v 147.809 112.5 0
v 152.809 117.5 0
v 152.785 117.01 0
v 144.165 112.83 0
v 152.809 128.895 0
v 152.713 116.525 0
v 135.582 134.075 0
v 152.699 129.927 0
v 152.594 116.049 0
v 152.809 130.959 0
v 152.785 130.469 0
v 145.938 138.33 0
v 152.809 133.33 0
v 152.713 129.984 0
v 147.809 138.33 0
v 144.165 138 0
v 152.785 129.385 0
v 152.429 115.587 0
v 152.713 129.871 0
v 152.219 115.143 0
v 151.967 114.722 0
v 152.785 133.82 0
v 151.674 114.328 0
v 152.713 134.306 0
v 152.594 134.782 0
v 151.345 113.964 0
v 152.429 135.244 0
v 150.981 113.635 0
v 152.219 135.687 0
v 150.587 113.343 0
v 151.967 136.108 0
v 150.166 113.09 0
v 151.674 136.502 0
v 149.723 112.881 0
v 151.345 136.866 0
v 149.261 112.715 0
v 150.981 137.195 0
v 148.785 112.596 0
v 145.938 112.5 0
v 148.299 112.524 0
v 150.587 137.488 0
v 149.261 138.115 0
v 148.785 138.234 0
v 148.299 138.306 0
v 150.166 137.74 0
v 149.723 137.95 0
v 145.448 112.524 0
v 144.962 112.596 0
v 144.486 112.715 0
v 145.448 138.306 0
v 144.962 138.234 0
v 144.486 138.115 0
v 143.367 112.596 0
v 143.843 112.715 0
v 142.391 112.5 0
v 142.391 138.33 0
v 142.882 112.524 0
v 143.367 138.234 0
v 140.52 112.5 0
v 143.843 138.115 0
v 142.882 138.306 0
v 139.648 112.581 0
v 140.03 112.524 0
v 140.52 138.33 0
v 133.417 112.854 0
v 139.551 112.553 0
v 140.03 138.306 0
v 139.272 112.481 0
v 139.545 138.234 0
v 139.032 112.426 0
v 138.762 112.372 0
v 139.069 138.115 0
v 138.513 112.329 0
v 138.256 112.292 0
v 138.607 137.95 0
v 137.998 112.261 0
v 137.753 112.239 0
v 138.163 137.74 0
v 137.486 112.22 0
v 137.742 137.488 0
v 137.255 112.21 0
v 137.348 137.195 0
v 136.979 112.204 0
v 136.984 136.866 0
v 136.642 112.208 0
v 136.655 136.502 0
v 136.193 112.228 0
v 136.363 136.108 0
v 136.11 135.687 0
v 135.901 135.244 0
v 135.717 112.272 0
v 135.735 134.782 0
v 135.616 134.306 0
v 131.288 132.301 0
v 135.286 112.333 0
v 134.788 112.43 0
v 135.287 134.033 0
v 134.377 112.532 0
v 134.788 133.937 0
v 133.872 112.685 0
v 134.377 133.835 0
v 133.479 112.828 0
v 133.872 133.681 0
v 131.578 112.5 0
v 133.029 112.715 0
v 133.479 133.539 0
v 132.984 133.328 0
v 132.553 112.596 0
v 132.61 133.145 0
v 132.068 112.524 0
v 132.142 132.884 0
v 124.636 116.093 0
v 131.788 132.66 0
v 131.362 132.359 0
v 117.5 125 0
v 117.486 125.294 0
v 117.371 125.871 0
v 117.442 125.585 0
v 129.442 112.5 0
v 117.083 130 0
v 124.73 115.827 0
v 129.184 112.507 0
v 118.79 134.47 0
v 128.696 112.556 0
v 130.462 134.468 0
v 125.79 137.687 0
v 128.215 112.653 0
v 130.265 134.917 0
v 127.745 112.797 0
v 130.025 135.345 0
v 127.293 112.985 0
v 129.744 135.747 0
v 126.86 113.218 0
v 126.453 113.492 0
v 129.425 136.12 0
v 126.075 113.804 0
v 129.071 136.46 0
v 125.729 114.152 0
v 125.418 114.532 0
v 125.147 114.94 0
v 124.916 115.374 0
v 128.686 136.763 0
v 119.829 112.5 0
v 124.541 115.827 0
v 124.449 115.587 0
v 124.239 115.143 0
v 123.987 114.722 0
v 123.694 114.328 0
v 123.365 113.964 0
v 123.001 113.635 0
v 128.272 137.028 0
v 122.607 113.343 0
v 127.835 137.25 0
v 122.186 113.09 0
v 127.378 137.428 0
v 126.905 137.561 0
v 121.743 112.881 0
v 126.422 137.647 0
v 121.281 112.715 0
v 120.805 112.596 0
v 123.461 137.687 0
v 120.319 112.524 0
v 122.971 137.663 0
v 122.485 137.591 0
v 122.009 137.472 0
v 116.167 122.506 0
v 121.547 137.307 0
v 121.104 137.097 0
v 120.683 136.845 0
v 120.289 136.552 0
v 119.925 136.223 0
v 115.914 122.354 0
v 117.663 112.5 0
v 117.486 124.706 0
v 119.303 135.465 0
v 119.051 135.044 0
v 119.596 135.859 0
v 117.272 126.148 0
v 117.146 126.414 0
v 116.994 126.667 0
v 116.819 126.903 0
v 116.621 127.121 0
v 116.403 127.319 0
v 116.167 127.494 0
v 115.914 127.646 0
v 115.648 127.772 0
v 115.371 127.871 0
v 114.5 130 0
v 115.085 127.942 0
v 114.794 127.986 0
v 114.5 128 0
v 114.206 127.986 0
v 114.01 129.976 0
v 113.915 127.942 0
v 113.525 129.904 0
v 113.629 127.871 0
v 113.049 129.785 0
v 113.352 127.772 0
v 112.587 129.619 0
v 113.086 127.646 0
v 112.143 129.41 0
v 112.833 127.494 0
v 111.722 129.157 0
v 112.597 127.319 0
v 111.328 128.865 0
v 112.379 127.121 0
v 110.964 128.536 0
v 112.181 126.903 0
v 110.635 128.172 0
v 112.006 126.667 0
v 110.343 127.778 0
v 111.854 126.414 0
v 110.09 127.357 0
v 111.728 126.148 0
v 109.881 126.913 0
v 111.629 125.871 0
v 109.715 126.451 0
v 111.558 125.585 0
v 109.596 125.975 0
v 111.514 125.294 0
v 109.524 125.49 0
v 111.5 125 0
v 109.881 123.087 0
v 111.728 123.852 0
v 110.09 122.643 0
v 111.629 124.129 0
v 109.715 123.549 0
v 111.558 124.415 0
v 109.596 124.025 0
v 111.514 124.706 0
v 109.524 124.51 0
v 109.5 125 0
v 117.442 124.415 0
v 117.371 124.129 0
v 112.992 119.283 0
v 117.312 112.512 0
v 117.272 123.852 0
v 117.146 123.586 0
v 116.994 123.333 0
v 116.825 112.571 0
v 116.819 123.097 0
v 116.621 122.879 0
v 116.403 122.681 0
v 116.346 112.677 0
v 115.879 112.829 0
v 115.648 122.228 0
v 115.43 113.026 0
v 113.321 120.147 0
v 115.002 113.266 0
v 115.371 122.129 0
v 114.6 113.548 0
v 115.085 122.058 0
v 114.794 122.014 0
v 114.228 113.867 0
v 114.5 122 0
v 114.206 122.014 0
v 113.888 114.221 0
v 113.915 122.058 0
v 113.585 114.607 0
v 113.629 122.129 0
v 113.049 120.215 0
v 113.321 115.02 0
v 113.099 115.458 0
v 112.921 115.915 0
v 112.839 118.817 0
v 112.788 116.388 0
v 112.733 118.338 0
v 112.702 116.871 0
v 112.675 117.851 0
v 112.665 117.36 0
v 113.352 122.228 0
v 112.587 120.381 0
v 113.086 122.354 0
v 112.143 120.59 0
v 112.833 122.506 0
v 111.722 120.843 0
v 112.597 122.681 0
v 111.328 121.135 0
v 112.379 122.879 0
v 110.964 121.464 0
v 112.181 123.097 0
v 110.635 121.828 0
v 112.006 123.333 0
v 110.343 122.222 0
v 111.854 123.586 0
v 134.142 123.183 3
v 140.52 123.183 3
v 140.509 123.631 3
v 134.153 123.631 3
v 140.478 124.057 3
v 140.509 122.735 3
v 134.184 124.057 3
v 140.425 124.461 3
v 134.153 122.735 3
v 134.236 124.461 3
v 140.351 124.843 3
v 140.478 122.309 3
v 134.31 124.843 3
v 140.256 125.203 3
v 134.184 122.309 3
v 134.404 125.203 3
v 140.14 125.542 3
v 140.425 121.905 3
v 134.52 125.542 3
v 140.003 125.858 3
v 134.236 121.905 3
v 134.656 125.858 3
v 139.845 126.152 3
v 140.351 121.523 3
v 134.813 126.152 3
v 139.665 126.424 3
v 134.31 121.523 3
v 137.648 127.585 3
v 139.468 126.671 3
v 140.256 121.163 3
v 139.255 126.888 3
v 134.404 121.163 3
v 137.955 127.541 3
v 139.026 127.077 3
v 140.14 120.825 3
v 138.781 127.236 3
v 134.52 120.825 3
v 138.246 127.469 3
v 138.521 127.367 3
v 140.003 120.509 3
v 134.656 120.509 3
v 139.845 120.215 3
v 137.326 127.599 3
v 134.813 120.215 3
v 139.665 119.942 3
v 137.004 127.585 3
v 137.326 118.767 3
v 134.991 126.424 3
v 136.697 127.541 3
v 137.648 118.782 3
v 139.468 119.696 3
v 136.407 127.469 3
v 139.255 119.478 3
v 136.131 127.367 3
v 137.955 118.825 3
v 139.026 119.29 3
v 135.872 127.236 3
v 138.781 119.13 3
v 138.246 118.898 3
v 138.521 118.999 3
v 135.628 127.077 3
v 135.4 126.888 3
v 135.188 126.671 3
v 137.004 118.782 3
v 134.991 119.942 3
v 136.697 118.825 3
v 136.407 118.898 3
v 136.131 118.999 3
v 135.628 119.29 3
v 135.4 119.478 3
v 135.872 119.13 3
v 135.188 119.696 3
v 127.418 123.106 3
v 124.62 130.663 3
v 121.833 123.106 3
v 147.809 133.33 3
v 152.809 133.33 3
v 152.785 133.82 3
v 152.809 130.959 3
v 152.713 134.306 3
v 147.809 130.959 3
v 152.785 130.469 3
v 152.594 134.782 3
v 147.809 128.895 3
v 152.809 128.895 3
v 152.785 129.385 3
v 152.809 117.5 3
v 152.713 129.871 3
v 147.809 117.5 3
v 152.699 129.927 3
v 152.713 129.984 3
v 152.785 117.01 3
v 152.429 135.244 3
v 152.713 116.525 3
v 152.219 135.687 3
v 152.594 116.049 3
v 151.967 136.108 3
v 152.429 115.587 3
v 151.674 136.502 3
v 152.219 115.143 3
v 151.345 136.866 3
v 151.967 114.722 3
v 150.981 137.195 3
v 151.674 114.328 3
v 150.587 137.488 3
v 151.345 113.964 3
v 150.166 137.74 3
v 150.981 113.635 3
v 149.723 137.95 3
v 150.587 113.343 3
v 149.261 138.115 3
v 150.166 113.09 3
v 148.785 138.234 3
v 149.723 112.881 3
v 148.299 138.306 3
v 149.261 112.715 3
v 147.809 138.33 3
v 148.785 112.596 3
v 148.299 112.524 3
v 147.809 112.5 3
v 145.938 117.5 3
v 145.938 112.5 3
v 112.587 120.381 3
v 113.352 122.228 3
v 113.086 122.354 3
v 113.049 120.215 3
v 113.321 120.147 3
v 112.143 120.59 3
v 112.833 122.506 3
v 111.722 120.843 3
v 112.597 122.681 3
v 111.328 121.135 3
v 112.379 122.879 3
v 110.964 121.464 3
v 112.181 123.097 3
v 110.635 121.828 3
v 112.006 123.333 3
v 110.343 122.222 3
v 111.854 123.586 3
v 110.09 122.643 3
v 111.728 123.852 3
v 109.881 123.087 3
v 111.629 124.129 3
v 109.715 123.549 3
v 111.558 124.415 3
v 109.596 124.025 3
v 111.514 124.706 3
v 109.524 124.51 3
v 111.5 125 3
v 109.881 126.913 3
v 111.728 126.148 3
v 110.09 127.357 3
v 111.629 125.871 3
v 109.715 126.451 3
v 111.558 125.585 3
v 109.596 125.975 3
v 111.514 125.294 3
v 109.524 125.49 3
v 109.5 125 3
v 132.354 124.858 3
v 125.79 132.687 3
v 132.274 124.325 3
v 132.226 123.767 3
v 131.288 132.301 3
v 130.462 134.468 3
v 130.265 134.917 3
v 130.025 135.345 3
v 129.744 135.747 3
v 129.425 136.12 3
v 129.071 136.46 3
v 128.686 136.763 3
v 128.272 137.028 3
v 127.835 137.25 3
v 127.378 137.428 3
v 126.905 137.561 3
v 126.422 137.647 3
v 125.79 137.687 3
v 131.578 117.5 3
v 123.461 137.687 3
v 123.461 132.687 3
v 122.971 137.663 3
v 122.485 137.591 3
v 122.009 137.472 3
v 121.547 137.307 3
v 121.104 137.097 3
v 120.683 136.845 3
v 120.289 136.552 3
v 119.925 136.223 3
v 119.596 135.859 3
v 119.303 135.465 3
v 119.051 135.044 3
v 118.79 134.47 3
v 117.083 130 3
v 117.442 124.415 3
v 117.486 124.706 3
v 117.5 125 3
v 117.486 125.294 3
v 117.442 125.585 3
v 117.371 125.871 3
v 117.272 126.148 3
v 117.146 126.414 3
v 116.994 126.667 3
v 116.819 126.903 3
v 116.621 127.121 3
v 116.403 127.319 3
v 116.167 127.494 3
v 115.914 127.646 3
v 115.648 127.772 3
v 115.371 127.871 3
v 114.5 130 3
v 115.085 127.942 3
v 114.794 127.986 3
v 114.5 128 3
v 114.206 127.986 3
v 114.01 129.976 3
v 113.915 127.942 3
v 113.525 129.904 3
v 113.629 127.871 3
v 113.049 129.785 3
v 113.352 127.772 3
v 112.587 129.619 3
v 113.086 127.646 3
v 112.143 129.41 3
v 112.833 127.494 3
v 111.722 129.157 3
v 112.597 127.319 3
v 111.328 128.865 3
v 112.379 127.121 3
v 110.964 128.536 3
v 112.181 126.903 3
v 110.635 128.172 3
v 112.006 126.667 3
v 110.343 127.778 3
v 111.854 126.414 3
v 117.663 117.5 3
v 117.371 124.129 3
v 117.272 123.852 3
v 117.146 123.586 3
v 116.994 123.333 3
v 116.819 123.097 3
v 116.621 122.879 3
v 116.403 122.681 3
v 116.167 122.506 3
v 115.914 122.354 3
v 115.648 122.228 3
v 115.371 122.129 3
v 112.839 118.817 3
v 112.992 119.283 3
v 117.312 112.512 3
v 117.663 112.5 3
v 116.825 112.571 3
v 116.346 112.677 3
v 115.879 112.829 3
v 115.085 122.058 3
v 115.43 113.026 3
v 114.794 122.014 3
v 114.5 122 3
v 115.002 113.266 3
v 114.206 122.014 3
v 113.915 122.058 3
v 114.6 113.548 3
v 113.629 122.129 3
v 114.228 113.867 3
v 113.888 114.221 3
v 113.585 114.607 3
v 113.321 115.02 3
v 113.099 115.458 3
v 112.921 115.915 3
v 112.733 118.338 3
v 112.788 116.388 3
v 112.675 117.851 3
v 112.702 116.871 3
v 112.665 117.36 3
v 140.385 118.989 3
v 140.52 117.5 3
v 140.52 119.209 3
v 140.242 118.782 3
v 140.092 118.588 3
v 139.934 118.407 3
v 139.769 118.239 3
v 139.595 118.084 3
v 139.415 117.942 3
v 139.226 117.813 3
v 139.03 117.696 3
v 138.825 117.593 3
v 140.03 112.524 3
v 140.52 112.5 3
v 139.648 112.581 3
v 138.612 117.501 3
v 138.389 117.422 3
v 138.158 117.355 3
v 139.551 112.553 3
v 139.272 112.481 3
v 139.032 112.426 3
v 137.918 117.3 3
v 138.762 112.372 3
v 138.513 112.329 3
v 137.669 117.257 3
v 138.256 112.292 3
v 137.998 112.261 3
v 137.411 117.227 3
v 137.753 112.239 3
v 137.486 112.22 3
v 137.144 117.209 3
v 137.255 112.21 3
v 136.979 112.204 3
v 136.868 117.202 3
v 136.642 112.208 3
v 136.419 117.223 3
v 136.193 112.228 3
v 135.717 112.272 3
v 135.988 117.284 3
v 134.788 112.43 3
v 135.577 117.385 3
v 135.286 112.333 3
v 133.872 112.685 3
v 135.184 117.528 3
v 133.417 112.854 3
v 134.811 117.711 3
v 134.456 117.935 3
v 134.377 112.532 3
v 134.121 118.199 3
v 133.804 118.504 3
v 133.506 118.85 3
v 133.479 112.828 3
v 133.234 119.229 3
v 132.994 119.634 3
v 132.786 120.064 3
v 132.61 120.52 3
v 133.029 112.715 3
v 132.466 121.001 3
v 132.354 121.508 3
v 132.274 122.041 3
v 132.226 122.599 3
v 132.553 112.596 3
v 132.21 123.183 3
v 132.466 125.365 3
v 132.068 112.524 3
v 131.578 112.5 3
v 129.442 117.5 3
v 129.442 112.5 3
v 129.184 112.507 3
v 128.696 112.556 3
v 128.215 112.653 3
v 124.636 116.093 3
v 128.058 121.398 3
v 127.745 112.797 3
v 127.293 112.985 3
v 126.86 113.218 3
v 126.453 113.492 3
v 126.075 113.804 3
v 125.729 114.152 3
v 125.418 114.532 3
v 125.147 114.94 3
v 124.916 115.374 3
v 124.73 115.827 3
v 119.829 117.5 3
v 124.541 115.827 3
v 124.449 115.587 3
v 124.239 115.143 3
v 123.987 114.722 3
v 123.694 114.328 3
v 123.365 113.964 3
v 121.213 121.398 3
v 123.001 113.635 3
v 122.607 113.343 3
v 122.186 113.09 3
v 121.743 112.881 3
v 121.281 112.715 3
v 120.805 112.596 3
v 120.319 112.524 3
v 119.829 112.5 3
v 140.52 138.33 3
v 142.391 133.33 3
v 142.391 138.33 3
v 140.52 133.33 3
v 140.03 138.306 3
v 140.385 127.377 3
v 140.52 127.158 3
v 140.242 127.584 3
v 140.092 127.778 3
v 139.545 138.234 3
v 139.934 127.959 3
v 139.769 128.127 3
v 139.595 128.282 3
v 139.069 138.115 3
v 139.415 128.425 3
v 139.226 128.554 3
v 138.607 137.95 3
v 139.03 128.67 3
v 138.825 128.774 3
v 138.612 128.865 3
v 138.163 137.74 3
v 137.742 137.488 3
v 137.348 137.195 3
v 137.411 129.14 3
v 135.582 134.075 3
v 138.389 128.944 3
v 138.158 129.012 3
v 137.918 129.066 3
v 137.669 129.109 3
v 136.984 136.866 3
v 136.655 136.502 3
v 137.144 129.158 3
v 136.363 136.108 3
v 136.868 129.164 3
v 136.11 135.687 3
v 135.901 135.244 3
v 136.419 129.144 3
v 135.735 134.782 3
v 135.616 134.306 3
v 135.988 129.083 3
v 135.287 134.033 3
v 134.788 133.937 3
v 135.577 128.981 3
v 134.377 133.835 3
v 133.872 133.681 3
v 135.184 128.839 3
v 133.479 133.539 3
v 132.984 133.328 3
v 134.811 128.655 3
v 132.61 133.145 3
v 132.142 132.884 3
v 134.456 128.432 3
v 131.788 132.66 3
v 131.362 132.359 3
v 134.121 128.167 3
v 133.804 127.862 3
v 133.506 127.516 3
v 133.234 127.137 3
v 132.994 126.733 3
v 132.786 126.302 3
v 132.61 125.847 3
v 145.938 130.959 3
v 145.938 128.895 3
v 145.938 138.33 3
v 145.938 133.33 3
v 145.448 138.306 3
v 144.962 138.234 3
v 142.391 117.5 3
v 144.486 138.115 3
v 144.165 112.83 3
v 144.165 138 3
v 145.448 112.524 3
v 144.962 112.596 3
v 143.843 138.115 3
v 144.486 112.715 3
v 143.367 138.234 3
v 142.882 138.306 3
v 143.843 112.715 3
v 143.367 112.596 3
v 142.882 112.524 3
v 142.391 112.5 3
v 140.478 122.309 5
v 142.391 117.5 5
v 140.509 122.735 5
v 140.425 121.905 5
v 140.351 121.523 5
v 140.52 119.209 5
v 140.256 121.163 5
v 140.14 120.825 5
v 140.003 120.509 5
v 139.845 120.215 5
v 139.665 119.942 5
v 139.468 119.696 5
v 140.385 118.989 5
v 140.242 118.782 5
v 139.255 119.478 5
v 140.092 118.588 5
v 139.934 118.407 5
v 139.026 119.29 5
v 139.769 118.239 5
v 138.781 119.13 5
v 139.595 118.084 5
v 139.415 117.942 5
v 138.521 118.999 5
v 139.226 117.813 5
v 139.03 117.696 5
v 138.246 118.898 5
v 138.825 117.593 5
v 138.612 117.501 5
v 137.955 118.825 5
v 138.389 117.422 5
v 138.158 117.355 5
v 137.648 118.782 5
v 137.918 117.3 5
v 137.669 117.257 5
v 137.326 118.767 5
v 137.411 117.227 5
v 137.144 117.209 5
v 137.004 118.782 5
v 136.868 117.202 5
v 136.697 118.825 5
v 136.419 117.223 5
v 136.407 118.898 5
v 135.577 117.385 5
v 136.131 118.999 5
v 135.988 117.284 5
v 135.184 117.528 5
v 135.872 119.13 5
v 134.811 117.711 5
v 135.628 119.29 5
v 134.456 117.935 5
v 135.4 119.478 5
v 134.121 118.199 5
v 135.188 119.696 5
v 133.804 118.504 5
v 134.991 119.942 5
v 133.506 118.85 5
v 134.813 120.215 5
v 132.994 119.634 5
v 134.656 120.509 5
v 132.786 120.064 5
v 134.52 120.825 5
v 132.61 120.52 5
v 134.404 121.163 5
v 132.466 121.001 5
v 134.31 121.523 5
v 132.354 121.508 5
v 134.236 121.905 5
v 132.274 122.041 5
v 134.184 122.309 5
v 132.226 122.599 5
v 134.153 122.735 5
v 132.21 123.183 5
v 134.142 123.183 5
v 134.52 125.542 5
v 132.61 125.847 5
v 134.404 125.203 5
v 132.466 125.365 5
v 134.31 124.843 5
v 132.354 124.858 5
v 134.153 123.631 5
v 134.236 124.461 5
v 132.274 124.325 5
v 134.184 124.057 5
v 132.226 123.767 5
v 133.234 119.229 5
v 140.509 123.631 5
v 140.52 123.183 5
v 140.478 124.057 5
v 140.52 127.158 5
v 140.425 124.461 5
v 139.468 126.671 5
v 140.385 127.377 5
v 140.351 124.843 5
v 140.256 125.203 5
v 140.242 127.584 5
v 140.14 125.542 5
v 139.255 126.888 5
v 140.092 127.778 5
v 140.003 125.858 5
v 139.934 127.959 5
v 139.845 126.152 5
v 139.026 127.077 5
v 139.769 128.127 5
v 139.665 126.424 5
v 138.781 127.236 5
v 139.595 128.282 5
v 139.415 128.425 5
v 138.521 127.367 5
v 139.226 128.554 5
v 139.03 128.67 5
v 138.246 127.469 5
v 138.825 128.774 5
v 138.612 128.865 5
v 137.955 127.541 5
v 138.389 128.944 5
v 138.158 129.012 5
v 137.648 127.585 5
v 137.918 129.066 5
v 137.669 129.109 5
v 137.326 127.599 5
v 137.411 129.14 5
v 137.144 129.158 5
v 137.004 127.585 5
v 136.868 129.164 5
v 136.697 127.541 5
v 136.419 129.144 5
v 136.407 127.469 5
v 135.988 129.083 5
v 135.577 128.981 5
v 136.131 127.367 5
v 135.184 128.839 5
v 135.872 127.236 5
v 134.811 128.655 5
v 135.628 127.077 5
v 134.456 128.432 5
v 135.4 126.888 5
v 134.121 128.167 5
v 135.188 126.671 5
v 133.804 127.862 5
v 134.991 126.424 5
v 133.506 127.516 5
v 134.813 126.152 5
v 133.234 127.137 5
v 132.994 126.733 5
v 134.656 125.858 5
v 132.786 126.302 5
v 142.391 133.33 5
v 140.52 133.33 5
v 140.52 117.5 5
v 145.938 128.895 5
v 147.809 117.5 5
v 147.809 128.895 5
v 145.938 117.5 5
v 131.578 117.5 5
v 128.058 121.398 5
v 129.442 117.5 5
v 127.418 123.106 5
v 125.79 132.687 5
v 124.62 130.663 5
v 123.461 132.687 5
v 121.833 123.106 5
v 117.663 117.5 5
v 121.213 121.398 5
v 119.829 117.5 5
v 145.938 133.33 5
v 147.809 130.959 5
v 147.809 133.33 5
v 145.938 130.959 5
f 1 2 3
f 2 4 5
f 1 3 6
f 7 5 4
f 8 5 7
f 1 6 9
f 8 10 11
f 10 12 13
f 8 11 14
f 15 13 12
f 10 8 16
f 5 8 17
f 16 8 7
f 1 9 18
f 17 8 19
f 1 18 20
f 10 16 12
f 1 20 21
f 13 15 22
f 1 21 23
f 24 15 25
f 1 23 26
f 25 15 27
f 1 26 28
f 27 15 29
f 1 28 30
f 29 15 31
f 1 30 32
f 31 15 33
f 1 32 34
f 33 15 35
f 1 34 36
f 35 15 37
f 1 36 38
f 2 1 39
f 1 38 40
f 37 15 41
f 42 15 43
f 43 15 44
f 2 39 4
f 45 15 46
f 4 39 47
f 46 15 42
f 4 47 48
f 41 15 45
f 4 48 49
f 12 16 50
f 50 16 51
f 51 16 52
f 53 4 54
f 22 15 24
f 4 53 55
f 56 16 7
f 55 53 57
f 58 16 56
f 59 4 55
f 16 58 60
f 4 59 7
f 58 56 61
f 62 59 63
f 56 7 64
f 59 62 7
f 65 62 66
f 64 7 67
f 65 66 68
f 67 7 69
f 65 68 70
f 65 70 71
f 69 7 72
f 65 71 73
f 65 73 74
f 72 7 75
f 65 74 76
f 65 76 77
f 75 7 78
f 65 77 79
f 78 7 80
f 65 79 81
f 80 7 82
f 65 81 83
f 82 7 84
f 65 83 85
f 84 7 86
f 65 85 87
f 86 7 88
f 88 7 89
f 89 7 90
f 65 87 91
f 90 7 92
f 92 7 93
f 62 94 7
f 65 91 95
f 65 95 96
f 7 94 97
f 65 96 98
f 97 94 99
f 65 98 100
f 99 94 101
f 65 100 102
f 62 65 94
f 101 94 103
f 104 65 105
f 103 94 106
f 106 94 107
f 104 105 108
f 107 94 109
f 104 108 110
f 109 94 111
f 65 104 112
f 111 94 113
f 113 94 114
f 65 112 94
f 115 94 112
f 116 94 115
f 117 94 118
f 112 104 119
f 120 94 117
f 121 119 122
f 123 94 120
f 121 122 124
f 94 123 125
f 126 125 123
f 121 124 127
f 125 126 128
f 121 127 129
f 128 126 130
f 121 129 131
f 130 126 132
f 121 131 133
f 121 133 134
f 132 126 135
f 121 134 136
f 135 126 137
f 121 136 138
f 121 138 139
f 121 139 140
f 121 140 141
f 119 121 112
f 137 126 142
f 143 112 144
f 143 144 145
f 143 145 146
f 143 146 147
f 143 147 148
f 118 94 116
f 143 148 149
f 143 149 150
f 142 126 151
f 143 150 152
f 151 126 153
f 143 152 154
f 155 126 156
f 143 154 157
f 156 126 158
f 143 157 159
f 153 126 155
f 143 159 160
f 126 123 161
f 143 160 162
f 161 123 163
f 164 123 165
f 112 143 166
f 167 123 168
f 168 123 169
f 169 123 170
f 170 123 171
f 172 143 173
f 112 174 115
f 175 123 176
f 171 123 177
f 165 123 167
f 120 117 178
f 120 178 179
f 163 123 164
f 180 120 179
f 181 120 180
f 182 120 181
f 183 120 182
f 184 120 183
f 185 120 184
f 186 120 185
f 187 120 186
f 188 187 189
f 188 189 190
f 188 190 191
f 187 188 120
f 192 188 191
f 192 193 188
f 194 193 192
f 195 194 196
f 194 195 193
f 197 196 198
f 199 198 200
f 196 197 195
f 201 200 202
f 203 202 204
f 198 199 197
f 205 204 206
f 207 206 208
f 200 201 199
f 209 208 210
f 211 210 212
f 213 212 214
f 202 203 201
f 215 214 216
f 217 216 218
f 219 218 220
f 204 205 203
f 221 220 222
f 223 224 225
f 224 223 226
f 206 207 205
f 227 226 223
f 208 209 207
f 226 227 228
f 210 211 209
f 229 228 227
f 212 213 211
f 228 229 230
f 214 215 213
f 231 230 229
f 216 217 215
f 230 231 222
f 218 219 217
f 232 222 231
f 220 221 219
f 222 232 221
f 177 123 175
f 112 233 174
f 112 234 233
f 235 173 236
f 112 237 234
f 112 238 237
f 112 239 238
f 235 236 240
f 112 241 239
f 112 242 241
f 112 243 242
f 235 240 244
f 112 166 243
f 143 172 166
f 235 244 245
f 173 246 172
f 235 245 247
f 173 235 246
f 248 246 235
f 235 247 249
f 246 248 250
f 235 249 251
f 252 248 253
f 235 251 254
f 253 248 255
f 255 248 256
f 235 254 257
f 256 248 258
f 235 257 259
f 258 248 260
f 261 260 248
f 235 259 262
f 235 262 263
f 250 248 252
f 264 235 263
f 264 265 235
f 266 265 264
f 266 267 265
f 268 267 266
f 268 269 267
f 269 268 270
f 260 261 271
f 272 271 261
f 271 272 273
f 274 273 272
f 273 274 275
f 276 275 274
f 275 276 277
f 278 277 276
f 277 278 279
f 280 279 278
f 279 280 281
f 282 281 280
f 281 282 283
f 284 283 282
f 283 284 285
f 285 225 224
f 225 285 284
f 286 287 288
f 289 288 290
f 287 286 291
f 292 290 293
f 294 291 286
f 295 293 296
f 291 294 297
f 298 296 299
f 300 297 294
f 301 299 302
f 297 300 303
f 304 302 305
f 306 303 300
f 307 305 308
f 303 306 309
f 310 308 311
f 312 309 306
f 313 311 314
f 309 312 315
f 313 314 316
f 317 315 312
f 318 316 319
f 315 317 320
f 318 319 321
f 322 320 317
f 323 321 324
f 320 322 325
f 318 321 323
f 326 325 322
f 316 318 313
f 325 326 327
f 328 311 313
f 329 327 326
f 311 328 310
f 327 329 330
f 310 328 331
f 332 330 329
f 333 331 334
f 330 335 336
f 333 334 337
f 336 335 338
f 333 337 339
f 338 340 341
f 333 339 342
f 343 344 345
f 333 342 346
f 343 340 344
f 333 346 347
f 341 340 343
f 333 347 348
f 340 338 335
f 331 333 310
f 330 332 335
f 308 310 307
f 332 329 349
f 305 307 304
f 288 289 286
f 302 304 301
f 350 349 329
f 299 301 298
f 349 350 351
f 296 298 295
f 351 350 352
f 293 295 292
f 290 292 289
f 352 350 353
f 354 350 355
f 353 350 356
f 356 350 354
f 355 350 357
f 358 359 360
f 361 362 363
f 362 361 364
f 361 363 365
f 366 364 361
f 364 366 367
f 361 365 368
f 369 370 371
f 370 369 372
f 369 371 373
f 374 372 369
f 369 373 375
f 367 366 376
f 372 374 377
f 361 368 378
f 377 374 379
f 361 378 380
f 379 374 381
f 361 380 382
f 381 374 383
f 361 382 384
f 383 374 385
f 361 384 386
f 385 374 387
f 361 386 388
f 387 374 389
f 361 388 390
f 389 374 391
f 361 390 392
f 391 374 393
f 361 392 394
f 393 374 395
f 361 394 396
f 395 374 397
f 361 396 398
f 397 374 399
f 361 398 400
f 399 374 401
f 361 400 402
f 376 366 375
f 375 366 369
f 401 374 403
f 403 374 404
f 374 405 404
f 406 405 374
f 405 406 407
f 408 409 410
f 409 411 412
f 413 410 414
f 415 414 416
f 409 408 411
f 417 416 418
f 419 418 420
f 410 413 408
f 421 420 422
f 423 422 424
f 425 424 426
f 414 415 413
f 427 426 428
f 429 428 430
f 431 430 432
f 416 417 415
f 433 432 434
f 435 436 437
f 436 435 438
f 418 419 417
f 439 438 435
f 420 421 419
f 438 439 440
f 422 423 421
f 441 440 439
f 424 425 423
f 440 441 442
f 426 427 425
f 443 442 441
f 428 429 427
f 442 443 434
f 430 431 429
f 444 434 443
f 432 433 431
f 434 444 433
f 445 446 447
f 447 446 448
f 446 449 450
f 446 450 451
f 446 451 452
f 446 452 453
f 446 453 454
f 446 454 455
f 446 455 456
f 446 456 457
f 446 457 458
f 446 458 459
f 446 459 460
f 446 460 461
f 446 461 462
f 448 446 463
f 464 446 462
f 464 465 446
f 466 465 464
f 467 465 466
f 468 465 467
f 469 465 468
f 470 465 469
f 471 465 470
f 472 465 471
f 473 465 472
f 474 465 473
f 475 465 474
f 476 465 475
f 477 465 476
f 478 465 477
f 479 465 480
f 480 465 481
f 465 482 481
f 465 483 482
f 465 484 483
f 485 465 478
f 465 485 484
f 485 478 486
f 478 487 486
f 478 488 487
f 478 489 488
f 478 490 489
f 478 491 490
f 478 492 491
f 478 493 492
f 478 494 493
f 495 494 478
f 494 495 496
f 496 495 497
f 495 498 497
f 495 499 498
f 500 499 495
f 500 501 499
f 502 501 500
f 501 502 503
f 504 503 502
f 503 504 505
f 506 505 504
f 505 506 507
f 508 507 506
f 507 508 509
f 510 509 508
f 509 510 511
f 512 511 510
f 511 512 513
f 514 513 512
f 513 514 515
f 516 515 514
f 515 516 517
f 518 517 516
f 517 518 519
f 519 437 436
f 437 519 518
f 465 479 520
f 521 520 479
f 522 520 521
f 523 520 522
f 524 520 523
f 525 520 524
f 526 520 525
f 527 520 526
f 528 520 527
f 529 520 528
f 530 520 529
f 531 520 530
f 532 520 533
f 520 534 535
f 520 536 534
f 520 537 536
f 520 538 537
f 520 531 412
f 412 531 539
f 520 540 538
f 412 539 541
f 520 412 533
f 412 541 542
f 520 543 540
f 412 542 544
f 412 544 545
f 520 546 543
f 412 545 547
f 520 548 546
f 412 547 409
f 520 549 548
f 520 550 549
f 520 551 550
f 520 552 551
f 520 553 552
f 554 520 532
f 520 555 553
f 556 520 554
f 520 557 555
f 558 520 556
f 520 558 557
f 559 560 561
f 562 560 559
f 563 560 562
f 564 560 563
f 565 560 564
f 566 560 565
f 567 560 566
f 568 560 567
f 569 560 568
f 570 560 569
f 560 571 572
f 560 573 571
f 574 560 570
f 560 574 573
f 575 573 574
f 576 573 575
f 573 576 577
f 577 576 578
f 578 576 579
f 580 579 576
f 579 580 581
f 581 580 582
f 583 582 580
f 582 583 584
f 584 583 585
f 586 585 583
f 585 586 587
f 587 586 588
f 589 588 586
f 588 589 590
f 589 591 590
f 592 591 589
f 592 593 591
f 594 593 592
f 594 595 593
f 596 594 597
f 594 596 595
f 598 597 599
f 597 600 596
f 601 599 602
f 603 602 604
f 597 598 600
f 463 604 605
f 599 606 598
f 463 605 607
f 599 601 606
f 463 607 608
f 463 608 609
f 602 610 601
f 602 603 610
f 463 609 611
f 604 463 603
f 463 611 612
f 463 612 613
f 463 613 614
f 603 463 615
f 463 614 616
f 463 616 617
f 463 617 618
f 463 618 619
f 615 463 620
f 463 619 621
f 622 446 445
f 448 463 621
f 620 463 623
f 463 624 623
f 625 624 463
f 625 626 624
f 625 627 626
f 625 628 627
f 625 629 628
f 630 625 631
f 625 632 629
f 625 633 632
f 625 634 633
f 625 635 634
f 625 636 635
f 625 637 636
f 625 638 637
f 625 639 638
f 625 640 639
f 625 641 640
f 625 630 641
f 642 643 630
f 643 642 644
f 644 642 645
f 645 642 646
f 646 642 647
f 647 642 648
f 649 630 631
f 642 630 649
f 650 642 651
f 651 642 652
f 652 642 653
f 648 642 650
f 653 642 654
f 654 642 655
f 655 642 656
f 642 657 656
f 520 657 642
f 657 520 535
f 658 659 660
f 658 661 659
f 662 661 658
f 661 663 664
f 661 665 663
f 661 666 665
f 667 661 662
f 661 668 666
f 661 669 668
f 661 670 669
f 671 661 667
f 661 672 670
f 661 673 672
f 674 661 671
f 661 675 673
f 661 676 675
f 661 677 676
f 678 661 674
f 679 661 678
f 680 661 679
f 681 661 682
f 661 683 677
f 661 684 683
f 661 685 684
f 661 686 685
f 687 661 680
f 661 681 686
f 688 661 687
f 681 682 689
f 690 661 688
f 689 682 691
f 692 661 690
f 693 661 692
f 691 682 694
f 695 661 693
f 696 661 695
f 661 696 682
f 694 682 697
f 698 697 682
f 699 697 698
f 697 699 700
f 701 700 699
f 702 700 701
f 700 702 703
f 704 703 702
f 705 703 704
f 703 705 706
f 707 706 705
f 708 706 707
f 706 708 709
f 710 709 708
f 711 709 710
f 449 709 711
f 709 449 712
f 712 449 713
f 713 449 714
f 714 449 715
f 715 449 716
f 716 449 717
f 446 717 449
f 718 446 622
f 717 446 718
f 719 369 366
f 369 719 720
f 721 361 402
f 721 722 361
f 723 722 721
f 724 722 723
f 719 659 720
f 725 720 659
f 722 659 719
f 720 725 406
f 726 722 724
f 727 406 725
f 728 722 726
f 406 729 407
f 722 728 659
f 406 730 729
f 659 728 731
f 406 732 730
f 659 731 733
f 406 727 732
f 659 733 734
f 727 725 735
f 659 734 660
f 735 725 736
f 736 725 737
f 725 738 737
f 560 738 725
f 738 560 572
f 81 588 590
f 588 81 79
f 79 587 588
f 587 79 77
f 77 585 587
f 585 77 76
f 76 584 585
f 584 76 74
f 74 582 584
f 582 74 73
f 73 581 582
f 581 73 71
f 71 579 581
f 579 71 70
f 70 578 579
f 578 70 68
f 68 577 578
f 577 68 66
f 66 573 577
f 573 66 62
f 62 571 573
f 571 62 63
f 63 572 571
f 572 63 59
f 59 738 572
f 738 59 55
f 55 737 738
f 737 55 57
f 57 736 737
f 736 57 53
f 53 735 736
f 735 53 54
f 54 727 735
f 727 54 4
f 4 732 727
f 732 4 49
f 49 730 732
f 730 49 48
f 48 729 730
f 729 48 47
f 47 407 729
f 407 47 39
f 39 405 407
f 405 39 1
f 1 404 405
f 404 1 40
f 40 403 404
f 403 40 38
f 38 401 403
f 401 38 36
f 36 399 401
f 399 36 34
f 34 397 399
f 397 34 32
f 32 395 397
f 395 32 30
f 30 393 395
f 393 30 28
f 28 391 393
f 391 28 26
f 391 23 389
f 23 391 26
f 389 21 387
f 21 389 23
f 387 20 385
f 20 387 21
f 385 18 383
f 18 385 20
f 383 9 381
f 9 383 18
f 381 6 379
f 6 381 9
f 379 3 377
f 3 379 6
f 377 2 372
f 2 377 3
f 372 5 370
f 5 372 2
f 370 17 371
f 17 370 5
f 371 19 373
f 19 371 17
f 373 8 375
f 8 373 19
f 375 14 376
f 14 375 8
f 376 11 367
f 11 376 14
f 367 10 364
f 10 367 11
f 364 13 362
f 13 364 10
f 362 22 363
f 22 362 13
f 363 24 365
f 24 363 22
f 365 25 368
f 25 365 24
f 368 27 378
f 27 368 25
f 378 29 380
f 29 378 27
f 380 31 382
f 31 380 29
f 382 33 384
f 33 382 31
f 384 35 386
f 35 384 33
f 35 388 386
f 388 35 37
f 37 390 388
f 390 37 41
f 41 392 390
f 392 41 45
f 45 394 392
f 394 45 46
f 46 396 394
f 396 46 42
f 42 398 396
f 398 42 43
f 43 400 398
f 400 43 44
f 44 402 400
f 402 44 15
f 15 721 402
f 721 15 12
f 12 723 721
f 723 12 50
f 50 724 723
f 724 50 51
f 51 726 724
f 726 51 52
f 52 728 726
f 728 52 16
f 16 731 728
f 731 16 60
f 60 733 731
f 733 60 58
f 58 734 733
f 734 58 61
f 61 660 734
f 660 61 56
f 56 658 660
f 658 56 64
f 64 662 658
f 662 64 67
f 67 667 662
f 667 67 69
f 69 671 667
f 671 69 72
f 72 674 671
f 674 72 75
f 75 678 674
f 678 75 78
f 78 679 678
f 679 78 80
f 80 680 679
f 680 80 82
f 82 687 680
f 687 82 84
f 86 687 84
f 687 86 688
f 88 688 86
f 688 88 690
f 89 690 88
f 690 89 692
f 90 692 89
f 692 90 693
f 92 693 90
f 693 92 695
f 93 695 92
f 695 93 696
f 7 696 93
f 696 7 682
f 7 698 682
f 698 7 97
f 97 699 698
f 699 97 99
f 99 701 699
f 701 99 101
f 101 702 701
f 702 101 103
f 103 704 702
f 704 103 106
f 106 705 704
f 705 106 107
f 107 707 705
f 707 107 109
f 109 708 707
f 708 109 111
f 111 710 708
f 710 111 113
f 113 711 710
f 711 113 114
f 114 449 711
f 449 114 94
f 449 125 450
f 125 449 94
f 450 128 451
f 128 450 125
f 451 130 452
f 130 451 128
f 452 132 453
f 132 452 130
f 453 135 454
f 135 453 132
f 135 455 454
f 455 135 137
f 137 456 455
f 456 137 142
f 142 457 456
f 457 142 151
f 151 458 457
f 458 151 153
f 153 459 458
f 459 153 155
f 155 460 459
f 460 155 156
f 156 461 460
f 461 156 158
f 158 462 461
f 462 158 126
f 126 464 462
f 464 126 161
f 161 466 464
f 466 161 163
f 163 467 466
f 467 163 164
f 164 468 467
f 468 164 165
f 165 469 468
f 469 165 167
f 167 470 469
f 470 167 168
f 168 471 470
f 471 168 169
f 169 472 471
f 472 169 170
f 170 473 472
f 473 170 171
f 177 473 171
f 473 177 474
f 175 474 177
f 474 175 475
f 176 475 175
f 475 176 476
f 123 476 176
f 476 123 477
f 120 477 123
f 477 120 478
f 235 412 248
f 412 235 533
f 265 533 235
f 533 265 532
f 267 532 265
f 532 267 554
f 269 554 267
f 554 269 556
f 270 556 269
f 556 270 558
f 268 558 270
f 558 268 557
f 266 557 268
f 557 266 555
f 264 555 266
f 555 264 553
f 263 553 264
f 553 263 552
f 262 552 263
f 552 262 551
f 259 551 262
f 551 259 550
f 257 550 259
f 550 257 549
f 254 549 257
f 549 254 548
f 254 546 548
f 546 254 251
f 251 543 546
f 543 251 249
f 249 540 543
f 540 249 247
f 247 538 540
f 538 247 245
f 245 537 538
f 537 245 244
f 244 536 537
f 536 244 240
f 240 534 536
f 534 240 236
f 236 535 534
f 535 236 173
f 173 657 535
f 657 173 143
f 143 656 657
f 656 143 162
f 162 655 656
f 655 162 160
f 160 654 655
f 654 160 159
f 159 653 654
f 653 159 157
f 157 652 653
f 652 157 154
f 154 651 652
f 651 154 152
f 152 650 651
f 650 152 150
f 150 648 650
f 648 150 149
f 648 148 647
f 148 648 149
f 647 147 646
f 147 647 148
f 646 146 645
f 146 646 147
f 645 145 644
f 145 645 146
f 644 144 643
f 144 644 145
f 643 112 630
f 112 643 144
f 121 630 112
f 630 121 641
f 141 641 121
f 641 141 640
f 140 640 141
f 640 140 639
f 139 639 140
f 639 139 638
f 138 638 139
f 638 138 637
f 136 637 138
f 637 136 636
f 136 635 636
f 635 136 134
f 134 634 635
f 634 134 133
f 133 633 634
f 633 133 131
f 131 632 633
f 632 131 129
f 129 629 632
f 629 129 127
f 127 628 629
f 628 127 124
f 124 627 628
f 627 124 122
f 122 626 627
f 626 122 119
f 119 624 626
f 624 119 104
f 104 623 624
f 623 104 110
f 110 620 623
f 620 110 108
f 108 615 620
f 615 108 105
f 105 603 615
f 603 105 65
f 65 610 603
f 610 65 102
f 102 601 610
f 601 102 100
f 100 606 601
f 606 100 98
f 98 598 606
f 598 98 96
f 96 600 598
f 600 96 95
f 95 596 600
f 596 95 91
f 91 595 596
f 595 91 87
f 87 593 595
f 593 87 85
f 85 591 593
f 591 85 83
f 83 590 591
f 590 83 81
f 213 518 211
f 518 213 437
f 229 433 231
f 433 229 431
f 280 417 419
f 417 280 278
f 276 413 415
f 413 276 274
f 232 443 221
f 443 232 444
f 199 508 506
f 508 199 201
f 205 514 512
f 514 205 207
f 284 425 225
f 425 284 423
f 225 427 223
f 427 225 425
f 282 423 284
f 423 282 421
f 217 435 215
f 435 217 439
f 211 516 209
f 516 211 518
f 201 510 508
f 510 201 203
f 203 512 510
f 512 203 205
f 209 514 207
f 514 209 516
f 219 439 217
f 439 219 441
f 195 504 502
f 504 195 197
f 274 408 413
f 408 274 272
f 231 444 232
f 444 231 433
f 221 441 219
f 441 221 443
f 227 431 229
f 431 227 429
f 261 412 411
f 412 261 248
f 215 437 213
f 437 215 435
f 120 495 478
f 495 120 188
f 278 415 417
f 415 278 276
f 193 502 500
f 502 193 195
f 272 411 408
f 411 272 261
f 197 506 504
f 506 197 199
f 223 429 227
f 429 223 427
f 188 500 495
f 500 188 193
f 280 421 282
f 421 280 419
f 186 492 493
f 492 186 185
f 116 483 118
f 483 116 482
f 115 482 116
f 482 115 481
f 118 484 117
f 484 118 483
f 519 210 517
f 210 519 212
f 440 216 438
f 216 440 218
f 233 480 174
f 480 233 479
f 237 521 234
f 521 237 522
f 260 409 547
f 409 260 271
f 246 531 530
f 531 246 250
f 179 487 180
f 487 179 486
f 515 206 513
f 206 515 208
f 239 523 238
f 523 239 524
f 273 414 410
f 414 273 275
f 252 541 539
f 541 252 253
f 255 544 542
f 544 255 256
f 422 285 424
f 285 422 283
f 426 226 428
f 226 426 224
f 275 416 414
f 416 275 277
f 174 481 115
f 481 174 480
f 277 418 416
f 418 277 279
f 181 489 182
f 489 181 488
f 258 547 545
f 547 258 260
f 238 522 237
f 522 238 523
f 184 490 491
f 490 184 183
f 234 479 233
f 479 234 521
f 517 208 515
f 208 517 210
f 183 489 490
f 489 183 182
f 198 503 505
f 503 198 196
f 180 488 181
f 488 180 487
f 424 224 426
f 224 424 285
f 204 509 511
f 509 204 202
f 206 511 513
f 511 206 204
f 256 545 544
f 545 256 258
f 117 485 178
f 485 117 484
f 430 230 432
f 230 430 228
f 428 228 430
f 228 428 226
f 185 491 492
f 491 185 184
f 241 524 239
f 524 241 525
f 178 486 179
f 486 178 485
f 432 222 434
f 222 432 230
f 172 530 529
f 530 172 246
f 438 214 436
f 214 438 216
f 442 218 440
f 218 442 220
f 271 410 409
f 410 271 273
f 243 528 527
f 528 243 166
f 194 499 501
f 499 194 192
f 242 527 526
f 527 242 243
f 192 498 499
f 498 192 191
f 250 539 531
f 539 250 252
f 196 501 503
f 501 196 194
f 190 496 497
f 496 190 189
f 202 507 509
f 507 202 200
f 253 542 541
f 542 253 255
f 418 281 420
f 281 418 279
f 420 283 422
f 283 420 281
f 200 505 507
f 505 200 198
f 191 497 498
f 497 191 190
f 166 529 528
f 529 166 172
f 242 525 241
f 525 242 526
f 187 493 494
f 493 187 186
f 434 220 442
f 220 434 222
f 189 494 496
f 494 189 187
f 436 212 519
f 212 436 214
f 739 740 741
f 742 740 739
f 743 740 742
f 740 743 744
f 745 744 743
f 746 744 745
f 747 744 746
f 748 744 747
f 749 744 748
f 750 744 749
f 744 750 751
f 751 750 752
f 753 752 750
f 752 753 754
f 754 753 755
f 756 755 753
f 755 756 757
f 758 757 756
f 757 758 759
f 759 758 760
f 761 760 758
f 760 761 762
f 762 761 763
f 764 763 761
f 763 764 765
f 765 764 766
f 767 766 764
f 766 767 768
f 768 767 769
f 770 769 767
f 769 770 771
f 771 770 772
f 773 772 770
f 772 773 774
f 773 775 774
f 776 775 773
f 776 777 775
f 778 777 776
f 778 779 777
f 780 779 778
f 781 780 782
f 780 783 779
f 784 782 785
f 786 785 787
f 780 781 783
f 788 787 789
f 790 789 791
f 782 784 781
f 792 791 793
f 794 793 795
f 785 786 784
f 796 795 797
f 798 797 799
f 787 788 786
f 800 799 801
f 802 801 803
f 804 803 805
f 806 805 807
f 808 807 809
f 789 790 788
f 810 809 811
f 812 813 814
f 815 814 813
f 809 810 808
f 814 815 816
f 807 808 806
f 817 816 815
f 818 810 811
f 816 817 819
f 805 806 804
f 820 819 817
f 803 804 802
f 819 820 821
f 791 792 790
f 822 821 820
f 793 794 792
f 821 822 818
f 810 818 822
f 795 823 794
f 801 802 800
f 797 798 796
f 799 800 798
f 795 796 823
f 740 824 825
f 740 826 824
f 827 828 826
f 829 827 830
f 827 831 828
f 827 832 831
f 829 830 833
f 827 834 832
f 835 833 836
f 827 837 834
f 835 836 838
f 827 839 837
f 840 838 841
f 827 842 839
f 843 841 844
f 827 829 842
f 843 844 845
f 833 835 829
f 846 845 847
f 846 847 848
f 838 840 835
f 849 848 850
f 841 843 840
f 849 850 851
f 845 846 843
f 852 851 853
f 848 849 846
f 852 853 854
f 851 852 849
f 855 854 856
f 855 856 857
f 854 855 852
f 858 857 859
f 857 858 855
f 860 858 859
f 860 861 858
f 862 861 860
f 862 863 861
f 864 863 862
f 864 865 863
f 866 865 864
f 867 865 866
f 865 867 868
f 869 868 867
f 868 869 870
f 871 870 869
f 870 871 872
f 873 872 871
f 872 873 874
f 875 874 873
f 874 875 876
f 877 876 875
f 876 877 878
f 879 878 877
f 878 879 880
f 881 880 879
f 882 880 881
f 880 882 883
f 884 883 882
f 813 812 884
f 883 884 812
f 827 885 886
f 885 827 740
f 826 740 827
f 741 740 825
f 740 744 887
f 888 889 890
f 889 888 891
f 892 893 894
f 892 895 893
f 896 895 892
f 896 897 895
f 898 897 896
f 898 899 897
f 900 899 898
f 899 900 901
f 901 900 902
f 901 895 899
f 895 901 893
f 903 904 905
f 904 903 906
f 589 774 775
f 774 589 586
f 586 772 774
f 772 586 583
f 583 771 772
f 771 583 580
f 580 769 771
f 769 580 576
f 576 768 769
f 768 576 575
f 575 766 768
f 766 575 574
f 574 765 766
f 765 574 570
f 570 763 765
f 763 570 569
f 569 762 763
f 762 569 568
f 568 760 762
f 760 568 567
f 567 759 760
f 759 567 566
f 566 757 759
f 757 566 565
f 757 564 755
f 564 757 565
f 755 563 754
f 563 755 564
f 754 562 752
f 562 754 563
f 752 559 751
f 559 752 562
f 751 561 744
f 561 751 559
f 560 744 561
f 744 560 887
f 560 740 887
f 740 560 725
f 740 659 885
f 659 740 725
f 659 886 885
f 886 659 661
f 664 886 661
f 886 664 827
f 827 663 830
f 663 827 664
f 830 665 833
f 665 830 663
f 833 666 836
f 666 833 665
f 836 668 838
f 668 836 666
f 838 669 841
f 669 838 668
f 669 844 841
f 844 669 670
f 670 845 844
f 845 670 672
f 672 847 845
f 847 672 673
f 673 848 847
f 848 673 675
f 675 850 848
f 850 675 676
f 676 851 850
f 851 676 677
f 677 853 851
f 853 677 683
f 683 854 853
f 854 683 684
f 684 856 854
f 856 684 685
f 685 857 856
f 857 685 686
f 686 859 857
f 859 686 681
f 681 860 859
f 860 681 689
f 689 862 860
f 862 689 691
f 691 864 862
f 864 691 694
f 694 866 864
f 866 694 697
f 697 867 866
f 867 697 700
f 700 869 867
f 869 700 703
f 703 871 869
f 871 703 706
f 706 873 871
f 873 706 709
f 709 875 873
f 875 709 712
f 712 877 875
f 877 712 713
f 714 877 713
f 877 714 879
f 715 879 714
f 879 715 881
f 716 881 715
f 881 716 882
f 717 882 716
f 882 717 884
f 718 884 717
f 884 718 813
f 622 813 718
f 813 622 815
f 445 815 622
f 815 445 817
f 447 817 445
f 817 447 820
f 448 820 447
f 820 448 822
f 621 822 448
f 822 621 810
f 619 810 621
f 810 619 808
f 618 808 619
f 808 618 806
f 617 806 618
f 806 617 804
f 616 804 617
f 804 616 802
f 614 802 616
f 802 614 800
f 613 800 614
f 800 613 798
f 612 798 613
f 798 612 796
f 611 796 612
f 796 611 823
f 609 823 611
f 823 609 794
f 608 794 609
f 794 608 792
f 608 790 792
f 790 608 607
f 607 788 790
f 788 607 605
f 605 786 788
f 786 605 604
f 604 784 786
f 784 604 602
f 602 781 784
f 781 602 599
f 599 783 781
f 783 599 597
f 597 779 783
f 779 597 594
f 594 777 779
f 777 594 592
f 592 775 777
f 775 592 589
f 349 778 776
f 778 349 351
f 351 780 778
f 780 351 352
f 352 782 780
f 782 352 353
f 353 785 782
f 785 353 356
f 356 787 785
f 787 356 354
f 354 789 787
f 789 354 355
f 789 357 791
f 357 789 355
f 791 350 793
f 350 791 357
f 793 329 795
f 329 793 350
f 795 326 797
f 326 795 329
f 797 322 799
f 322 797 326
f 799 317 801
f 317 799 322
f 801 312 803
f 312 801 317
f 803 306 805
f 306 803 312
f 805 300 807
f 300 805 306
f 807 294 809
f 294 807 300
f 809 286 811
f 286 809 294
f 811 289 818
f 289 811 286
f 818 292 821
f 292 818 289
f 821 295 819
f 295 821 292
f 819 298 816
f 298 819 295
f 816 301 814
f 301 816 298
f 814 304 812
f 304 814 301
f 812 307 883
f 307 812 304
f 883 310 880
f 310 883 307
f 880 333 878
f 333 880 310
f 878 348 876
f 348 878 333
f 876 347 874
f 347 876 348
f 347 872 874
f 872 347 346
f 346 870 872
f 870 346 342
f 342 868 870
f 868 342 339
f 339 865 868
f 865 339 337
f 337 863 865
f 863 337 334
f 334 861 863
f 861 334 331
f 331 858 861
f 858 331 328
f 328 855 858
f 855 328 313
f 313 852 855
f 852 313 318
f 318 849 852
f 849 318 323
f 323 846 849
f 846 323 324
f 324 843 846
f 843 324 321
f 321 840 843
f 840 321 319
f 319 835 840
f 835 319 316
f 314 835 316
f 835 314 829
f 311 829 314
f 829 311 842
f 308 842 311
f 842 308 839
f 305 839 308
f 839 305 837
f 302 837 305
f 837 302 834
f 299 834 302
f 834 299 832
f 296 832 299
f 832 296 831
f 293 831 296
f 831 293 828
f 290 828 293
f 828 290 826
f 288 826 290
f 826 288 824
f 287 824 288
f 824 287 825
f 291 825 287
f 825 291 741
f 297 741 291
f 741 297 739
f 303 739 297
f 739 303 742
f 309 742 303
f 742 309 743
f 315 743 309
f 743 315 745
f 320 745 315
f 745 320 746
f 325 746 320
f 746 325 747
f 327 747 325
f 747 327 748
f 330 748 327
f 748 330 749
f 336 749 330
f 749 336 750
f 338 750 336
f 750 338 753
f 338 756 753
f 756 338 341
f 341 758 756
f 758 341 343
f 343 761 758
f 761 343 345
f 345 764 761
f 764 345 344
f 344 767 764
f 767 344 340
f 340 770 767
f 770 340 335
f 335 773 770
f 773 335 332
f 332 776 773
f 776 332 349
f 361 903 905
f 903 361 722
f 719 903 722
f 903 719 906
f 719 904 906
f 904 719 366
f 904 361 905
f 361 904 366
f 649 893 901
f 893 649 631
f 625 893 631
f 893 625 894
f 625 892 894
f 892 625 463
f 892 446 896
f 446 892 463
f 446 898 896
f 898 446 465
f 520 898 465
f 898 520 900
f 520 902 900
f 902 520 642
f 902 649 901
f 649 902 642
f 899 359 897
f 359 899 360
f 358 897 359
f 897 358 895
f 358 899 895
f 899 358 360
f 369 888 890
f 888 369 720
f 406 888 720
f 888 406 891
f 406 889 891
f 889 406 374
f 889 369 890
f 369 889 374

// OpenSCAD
// =========================================================================
//   CUSTOM KEYCHAIN – COMBINED VERSION (Auto-detect Ligatures ff / fi / fl)
// =========================================================================

/* [Nama] */
n1 = "Adi";
n2 = "";
n3 = "";
n4 = "";
n5 = "";
n6 = "";

/* [Warna] */
Plate_Color_Name = "Barbie Pink";    // [Yellow, White, Sky Blue, Red, Peak Green, Orange, Grape Purple, Black, Beige, Barbie Pink]
Text_Color_Name  = "White"; // [Yellow, White, Sky Blue, Red, Peak Green, Orange, Grape Purple, Black, Beige, Barbie Pink]

/* [Font Settings] */
Font_Name         = "Bagel Fat One"; // font [Bagel Fat One, Chewy, Courgette, Dancing Script, Lemon, Lobster, Pacifico, Playfair, Lily Script One, Sacramento, Bubblegum Sans, DynaPuff, Alkatra, Archivo, Sour Gummy, Shrikhand]
Font_Size         = 15;
Font_Weight_Steps = 0; // [-10:1:20]
Font_Weight       = Font_Weight_Steps / 10;

// Width scale for individual character layout (used when ligature is detected)
Width_Scale       = 1.0;   // [0.8:0.02:1.5]
// Extra space between characters for ligatures ff / fi / fl
Ligature_Extra    = 1.5;   // [0:0.1:5]

/* [Font Spacing Calibration] */
// Metode perhitungan jarak (0 = Metode Asli, 1 = Metode Rata-rata/Average)
Spacing_Method    = 0; // [0: Asli, 1: Rata-Rata]

// Jenis tabel lebar huruf (0 = Kalibrasi v6, 1 = Kustom 0.70)
Table_Type        = 0; // [0: Kalibrasi v6, 1: Kustom 0.70]

/* [Model Settings] */
Text_Height        = 2;
Plate_Height       = 3;
Border_Size        = 5;
Hole_Radius        = 3;
Ring_Offset        = 0;
Hole_Height_Offset = 0;
Offset_L1          = 0; // [-40:1:40]

/* [Layout Grid] */
bed_x     = 235;
bed_y     = 235;
grid_cols = 1;
slot_w    = 90;
gap_x     = 15;
gap_y     = 15;

function getColor(name) =
    name == "Yellow"       ? "#FFD700" :
    name == "White"        ? "#FFFFFF" :
    name == "Sky Blue"     ? "#87CEEB" :
    name == "Red"          ? "#FF0000" :
    name == "Peak Green"   ? "#00C853" :
    name == "Orange"       ? "#FF5E00" :
    name == "Grape Purple" ? "#6A0DAD" :
    name == "Black"        ? "#000000" :
    name == "Beige"        ? "#D9B99b" : // Beige dari kodingan 1
    name == "Barbie Pink"  ? "#FF69B4" :
    "#FFFFFF";

Plate_Color = getColor(Plate_Color_Name);
Text_Color  = getColor(Text_Color_Name);
$fn = 64;

slot_h = Font_Size + 2 * Border_Size;

function fixedHoleY() = Font_Size * 0.5 + Hole_Height_Offset;

// ─────────────────────────────────────────────
// LOOKUP TABLE FOR CHARACTER WIDTHS
// ─────────────────────────────────────────────
function char_w_raw(c, type) =
    type == 0 ? (
        // Kalibrasi v6 (Rekomendasi - Dioptimasi presisi agar bebas renggang/ompong & bebas menempel)
        c=="A" ? 0.96 : c=="B" ? 0.80 : c=="C" ? 0.84 :
        c=="D" ? 0.84 : c=="E" ? 0.86 : c=="F" ? 0.76 :
        c=="G" ? 0.96 : c=="H" ? 0.93 : c=="I" ? 0.4  :
        c=="J" ? 0.76 : c=="K" ? 0.92 : c=="L" ? 0.74 :
        c=="M" ? 1.20 : c=="N" ? 0.98 : c=="O" ? 0.90 :
        c=="P" ? 0.88 : c=="Q" ? 0.90 : c=="R" ? 0.92 :
        c=="S" ? 0.90 : c=="T" ? 0.74 : c=="U" ? 0.86 :
        c=="V" ? 0.84 : c=="W" ? 1.14 : c=="X" ? 0.80 :
        c=="Y" ? 0.78 : c=="Z" ? 0.78 :
        c=="a" ? 0.78 : c=="b" ? 0.76 : c=="c" ? 0.74 :
        c=="d" ? 0.84 : c=="e" ? 0.76 : c=="f" ? 0.54 :
        c=="g" ? 0.76 : c=="h" ? 0.78 : c=="i" ? 0.38 : // Dioptimasi agar huruf setelah 'i' tidak menempel
        c=="j" ? 0.44 : c=="k" ? 0.84 : c=="l" ? 0.38 : // Dioptimasi agar huruf setelah 'l' tidak menempel
        c=="m" ? 1.14 : c=="n" ? 0.78 : c=="o" ? 0.78 :
        c=="p" ? 0.76 : c=="q" ? 0.86 : c=="r" ? 0.70 : // Dioptimasi agar 'rn' tidak menempel
        c=="s" ? 0.76 : c=="t" ? 0.70 : c=="u" ? 0.84 : // Dioptimasi agar 'sh' tidak menempel
        c=="v" ? 0.74 : c=="w" ? 1.14 : c=="x" ? 0.70 :
        c=="y" ? 0.74 : c=="z" ? 0.80 : 
        c=="." ? 0.10 :
        c==" " ? 0.50 : 0.76
    ) : (
        // Kustom 0.70
        c=="A" ? 0.96 : c=="B" ? 0.80 : c=="C" ? 0.84 :
        c=="D" ? 0.84 : c=="E" ? 0.76 : c=="F" ? 0.76 :
        c=="G" ? 0.86 : c=="H" ? 0.86 : c=="I" ? 0.4  :
        c=="J" ? 0.56 : c=="K" ? 0.82 : c=="L" ? 0.74 :
        c=="M" ? 1.00 : c=="N" ? 0.98 : c=="O" ? 0.90 :
        c=="P" ? 0.78 : c=="Q" ? 0.90 : c=="R" ? 0.92 :
        c=="S" ? 0.76 : c=="T" ? 0.74 : c=="U" ? 0.86 :
        c=="V" ? 0.84 : c=="W" ? 1.04 : c=="X" ? 0.80 :
        c=="Y" ? 0.78 : c=="Z" ? 0.78 :
        c=="a" ? 0.78 : c=="b" ? 0.70 : c=="c" ? 0.70 :
        c=="d" ? 0.70 : c=="e" ? 0.70 : c=="f" ? 0.54 :
        c=="g" ? 0.70 : c=="h" ? 0.70 : c=="i" ? 0.36 :
        c=="j" ? 0.70 : c=="k" ? 0.70 : c=="l" ? 0.70 :
        c=="m" ? 0.70 : c=="n" ? 0.70 : c=="o" ? 0.70 :
        c=="p" ? 0.70 : c=="q" ? 0.70 : c=="r" ? 0.70 :
        c=="s" ? 0.70 : c=="t" ? 0.70 : c=="u" ? 0.70 :
        c=="v" ? 0.70 : c=="w" ? 0.70 : c=="x" ? 0.70 :
        c=="y" ? 0.70 : c=="z" ? 0.70 :
        c==" " ? 0.50 : 0.76
    );

function char_w(c) = char_w_raw(c, Table_Type);

// ─────────────────────────────────────────────
// DETEKSI & LOGIC LIGATURE
// ─────────────────────────────────────────────

// Fungsi untuk mengecek apakah ada pasangan ligature pada index tertentu
function is_ligature(prev, cur) =
    prev == "f" && (cur == "f" || cur == "i" || cur == "l");

// Fungsi rekursif untuk mengecek apakah kata mengandung ligature ff, fi, atau fl
function has_ligature(word, idx = 0) =
    idx >= len(word) - 1 ? false :
    is_ligature(word[idx], word[idx+1]) ? true :
    has_ligature(word, idx + 1);

// Menghitung koordinat X
function cx(word, idx) =
    idx == 0 ? 0 :
    cx(word, idx-1)
    + (
        Spacing_Method == 0 ? 
        char_w(word[idx-1]) * Font_Size * Width_Scale : 
        ((char_w(word[idx-1]) + char_w(word[idx])) / 2) * Font_Size * Width_Scale
    )
    + (is_ligature(word[idx-1], word[idx]) ? Ligature_Extra : 0);

// Merender kata huruf demi huruf (agar koreksi jarak ligature aktif)
module render_chars(word) {
    for (i = [0 : len(word) - 1]) {
        translate([cx(word, i), 0, 0])
            offset(delta = Font_Weight)
                text(word[i], size = Font_Size, font = Font_Name);
    }
}

// ─────────────────────────────────────────────
// GEOMETRY GENERATION
// ─────────────────────────────────────────────

module generateTextShape(l1) {
    translate([Offset_L1, 0, 0]) {
        if (has_ligature(l1)) {
            // Gunakan render per-karakter jika ada ligature (contoh: "Raffi", "Adifirnan", "Nafisha")
            render_chars(l1);
        } else {
            // Gunakan render bawaan OpenSCAD jika normal (contoh: "Adi", "Fahram")
            offset(delta = Font_Weight)
                text(l1, size = Font_Size, font = Font_Name);
        }
    }
}

module generateBackPlate(l1) {
    linear_extrude(Plate_Height)
        offset(r = Border_Size)
            generateTextShape(l1);
    hull() {
        translate([(-3 + Ring_Offset), fixedHoleY(), 0])
            cylinder(h = Plate_Height, r = Hole_Radius + 2);
        translate([2, fixedHoleY(), 0])
            cylinder(h = Plate_Height, r = Hole_Radius + 2);
    }
}

module generateBackPlateWithHole(l1) {
    color(Plate_Color)
    difference() {
        generateBackPlate(l1);
        translate([(-3 + Ring_Offset), fixedHoleY(), 0])
            cylinder(h = Plate_Height, r = Hole_Radius);
    }
}

module generateKeychainText(l1) {
    color(Text_Color)
    translate([0, 0, Plate_Height])
    linear_extrude(Text_Height)
        generateTextShape(l1);
}

module keychain(l1) {
    generateBackPlateWithHole(l1);
    generateKeychainText(l1);
}

// ─────────────────────────────────────────────
// GRID PLACEMENT
// ─────────────────────────────────────────────

all    = [n1, n2, n3, n4, n5, n6];
filled = [for (n = all) if (n != "") n];
total  = len(filled);

grid_rows = ceil(total / grid_cols);
total_w   = grid_cols * slot_w + (grid_cols - 1) * gap_x;
total_h   = grid_rows * slot_h + (grid_rows - 1) * gap_y;
start_x   = (bed_x - total_w) / 2 + slot_w / 2;
start_y   = (bed_y - total_h) / 2 + slot_h / 2;

for (idx = [0 : total - 1]) {
    col = idx % grid_cols;
    row = floor(idx / grid_cols);
    x   = start_x + col * (slot_w + gap_x);
    y   = start_y + (grid_rows - 1 - row) * (slot_h + gap_y);
    translate([x, y, 0]) keychain(filled[idx]);
}
